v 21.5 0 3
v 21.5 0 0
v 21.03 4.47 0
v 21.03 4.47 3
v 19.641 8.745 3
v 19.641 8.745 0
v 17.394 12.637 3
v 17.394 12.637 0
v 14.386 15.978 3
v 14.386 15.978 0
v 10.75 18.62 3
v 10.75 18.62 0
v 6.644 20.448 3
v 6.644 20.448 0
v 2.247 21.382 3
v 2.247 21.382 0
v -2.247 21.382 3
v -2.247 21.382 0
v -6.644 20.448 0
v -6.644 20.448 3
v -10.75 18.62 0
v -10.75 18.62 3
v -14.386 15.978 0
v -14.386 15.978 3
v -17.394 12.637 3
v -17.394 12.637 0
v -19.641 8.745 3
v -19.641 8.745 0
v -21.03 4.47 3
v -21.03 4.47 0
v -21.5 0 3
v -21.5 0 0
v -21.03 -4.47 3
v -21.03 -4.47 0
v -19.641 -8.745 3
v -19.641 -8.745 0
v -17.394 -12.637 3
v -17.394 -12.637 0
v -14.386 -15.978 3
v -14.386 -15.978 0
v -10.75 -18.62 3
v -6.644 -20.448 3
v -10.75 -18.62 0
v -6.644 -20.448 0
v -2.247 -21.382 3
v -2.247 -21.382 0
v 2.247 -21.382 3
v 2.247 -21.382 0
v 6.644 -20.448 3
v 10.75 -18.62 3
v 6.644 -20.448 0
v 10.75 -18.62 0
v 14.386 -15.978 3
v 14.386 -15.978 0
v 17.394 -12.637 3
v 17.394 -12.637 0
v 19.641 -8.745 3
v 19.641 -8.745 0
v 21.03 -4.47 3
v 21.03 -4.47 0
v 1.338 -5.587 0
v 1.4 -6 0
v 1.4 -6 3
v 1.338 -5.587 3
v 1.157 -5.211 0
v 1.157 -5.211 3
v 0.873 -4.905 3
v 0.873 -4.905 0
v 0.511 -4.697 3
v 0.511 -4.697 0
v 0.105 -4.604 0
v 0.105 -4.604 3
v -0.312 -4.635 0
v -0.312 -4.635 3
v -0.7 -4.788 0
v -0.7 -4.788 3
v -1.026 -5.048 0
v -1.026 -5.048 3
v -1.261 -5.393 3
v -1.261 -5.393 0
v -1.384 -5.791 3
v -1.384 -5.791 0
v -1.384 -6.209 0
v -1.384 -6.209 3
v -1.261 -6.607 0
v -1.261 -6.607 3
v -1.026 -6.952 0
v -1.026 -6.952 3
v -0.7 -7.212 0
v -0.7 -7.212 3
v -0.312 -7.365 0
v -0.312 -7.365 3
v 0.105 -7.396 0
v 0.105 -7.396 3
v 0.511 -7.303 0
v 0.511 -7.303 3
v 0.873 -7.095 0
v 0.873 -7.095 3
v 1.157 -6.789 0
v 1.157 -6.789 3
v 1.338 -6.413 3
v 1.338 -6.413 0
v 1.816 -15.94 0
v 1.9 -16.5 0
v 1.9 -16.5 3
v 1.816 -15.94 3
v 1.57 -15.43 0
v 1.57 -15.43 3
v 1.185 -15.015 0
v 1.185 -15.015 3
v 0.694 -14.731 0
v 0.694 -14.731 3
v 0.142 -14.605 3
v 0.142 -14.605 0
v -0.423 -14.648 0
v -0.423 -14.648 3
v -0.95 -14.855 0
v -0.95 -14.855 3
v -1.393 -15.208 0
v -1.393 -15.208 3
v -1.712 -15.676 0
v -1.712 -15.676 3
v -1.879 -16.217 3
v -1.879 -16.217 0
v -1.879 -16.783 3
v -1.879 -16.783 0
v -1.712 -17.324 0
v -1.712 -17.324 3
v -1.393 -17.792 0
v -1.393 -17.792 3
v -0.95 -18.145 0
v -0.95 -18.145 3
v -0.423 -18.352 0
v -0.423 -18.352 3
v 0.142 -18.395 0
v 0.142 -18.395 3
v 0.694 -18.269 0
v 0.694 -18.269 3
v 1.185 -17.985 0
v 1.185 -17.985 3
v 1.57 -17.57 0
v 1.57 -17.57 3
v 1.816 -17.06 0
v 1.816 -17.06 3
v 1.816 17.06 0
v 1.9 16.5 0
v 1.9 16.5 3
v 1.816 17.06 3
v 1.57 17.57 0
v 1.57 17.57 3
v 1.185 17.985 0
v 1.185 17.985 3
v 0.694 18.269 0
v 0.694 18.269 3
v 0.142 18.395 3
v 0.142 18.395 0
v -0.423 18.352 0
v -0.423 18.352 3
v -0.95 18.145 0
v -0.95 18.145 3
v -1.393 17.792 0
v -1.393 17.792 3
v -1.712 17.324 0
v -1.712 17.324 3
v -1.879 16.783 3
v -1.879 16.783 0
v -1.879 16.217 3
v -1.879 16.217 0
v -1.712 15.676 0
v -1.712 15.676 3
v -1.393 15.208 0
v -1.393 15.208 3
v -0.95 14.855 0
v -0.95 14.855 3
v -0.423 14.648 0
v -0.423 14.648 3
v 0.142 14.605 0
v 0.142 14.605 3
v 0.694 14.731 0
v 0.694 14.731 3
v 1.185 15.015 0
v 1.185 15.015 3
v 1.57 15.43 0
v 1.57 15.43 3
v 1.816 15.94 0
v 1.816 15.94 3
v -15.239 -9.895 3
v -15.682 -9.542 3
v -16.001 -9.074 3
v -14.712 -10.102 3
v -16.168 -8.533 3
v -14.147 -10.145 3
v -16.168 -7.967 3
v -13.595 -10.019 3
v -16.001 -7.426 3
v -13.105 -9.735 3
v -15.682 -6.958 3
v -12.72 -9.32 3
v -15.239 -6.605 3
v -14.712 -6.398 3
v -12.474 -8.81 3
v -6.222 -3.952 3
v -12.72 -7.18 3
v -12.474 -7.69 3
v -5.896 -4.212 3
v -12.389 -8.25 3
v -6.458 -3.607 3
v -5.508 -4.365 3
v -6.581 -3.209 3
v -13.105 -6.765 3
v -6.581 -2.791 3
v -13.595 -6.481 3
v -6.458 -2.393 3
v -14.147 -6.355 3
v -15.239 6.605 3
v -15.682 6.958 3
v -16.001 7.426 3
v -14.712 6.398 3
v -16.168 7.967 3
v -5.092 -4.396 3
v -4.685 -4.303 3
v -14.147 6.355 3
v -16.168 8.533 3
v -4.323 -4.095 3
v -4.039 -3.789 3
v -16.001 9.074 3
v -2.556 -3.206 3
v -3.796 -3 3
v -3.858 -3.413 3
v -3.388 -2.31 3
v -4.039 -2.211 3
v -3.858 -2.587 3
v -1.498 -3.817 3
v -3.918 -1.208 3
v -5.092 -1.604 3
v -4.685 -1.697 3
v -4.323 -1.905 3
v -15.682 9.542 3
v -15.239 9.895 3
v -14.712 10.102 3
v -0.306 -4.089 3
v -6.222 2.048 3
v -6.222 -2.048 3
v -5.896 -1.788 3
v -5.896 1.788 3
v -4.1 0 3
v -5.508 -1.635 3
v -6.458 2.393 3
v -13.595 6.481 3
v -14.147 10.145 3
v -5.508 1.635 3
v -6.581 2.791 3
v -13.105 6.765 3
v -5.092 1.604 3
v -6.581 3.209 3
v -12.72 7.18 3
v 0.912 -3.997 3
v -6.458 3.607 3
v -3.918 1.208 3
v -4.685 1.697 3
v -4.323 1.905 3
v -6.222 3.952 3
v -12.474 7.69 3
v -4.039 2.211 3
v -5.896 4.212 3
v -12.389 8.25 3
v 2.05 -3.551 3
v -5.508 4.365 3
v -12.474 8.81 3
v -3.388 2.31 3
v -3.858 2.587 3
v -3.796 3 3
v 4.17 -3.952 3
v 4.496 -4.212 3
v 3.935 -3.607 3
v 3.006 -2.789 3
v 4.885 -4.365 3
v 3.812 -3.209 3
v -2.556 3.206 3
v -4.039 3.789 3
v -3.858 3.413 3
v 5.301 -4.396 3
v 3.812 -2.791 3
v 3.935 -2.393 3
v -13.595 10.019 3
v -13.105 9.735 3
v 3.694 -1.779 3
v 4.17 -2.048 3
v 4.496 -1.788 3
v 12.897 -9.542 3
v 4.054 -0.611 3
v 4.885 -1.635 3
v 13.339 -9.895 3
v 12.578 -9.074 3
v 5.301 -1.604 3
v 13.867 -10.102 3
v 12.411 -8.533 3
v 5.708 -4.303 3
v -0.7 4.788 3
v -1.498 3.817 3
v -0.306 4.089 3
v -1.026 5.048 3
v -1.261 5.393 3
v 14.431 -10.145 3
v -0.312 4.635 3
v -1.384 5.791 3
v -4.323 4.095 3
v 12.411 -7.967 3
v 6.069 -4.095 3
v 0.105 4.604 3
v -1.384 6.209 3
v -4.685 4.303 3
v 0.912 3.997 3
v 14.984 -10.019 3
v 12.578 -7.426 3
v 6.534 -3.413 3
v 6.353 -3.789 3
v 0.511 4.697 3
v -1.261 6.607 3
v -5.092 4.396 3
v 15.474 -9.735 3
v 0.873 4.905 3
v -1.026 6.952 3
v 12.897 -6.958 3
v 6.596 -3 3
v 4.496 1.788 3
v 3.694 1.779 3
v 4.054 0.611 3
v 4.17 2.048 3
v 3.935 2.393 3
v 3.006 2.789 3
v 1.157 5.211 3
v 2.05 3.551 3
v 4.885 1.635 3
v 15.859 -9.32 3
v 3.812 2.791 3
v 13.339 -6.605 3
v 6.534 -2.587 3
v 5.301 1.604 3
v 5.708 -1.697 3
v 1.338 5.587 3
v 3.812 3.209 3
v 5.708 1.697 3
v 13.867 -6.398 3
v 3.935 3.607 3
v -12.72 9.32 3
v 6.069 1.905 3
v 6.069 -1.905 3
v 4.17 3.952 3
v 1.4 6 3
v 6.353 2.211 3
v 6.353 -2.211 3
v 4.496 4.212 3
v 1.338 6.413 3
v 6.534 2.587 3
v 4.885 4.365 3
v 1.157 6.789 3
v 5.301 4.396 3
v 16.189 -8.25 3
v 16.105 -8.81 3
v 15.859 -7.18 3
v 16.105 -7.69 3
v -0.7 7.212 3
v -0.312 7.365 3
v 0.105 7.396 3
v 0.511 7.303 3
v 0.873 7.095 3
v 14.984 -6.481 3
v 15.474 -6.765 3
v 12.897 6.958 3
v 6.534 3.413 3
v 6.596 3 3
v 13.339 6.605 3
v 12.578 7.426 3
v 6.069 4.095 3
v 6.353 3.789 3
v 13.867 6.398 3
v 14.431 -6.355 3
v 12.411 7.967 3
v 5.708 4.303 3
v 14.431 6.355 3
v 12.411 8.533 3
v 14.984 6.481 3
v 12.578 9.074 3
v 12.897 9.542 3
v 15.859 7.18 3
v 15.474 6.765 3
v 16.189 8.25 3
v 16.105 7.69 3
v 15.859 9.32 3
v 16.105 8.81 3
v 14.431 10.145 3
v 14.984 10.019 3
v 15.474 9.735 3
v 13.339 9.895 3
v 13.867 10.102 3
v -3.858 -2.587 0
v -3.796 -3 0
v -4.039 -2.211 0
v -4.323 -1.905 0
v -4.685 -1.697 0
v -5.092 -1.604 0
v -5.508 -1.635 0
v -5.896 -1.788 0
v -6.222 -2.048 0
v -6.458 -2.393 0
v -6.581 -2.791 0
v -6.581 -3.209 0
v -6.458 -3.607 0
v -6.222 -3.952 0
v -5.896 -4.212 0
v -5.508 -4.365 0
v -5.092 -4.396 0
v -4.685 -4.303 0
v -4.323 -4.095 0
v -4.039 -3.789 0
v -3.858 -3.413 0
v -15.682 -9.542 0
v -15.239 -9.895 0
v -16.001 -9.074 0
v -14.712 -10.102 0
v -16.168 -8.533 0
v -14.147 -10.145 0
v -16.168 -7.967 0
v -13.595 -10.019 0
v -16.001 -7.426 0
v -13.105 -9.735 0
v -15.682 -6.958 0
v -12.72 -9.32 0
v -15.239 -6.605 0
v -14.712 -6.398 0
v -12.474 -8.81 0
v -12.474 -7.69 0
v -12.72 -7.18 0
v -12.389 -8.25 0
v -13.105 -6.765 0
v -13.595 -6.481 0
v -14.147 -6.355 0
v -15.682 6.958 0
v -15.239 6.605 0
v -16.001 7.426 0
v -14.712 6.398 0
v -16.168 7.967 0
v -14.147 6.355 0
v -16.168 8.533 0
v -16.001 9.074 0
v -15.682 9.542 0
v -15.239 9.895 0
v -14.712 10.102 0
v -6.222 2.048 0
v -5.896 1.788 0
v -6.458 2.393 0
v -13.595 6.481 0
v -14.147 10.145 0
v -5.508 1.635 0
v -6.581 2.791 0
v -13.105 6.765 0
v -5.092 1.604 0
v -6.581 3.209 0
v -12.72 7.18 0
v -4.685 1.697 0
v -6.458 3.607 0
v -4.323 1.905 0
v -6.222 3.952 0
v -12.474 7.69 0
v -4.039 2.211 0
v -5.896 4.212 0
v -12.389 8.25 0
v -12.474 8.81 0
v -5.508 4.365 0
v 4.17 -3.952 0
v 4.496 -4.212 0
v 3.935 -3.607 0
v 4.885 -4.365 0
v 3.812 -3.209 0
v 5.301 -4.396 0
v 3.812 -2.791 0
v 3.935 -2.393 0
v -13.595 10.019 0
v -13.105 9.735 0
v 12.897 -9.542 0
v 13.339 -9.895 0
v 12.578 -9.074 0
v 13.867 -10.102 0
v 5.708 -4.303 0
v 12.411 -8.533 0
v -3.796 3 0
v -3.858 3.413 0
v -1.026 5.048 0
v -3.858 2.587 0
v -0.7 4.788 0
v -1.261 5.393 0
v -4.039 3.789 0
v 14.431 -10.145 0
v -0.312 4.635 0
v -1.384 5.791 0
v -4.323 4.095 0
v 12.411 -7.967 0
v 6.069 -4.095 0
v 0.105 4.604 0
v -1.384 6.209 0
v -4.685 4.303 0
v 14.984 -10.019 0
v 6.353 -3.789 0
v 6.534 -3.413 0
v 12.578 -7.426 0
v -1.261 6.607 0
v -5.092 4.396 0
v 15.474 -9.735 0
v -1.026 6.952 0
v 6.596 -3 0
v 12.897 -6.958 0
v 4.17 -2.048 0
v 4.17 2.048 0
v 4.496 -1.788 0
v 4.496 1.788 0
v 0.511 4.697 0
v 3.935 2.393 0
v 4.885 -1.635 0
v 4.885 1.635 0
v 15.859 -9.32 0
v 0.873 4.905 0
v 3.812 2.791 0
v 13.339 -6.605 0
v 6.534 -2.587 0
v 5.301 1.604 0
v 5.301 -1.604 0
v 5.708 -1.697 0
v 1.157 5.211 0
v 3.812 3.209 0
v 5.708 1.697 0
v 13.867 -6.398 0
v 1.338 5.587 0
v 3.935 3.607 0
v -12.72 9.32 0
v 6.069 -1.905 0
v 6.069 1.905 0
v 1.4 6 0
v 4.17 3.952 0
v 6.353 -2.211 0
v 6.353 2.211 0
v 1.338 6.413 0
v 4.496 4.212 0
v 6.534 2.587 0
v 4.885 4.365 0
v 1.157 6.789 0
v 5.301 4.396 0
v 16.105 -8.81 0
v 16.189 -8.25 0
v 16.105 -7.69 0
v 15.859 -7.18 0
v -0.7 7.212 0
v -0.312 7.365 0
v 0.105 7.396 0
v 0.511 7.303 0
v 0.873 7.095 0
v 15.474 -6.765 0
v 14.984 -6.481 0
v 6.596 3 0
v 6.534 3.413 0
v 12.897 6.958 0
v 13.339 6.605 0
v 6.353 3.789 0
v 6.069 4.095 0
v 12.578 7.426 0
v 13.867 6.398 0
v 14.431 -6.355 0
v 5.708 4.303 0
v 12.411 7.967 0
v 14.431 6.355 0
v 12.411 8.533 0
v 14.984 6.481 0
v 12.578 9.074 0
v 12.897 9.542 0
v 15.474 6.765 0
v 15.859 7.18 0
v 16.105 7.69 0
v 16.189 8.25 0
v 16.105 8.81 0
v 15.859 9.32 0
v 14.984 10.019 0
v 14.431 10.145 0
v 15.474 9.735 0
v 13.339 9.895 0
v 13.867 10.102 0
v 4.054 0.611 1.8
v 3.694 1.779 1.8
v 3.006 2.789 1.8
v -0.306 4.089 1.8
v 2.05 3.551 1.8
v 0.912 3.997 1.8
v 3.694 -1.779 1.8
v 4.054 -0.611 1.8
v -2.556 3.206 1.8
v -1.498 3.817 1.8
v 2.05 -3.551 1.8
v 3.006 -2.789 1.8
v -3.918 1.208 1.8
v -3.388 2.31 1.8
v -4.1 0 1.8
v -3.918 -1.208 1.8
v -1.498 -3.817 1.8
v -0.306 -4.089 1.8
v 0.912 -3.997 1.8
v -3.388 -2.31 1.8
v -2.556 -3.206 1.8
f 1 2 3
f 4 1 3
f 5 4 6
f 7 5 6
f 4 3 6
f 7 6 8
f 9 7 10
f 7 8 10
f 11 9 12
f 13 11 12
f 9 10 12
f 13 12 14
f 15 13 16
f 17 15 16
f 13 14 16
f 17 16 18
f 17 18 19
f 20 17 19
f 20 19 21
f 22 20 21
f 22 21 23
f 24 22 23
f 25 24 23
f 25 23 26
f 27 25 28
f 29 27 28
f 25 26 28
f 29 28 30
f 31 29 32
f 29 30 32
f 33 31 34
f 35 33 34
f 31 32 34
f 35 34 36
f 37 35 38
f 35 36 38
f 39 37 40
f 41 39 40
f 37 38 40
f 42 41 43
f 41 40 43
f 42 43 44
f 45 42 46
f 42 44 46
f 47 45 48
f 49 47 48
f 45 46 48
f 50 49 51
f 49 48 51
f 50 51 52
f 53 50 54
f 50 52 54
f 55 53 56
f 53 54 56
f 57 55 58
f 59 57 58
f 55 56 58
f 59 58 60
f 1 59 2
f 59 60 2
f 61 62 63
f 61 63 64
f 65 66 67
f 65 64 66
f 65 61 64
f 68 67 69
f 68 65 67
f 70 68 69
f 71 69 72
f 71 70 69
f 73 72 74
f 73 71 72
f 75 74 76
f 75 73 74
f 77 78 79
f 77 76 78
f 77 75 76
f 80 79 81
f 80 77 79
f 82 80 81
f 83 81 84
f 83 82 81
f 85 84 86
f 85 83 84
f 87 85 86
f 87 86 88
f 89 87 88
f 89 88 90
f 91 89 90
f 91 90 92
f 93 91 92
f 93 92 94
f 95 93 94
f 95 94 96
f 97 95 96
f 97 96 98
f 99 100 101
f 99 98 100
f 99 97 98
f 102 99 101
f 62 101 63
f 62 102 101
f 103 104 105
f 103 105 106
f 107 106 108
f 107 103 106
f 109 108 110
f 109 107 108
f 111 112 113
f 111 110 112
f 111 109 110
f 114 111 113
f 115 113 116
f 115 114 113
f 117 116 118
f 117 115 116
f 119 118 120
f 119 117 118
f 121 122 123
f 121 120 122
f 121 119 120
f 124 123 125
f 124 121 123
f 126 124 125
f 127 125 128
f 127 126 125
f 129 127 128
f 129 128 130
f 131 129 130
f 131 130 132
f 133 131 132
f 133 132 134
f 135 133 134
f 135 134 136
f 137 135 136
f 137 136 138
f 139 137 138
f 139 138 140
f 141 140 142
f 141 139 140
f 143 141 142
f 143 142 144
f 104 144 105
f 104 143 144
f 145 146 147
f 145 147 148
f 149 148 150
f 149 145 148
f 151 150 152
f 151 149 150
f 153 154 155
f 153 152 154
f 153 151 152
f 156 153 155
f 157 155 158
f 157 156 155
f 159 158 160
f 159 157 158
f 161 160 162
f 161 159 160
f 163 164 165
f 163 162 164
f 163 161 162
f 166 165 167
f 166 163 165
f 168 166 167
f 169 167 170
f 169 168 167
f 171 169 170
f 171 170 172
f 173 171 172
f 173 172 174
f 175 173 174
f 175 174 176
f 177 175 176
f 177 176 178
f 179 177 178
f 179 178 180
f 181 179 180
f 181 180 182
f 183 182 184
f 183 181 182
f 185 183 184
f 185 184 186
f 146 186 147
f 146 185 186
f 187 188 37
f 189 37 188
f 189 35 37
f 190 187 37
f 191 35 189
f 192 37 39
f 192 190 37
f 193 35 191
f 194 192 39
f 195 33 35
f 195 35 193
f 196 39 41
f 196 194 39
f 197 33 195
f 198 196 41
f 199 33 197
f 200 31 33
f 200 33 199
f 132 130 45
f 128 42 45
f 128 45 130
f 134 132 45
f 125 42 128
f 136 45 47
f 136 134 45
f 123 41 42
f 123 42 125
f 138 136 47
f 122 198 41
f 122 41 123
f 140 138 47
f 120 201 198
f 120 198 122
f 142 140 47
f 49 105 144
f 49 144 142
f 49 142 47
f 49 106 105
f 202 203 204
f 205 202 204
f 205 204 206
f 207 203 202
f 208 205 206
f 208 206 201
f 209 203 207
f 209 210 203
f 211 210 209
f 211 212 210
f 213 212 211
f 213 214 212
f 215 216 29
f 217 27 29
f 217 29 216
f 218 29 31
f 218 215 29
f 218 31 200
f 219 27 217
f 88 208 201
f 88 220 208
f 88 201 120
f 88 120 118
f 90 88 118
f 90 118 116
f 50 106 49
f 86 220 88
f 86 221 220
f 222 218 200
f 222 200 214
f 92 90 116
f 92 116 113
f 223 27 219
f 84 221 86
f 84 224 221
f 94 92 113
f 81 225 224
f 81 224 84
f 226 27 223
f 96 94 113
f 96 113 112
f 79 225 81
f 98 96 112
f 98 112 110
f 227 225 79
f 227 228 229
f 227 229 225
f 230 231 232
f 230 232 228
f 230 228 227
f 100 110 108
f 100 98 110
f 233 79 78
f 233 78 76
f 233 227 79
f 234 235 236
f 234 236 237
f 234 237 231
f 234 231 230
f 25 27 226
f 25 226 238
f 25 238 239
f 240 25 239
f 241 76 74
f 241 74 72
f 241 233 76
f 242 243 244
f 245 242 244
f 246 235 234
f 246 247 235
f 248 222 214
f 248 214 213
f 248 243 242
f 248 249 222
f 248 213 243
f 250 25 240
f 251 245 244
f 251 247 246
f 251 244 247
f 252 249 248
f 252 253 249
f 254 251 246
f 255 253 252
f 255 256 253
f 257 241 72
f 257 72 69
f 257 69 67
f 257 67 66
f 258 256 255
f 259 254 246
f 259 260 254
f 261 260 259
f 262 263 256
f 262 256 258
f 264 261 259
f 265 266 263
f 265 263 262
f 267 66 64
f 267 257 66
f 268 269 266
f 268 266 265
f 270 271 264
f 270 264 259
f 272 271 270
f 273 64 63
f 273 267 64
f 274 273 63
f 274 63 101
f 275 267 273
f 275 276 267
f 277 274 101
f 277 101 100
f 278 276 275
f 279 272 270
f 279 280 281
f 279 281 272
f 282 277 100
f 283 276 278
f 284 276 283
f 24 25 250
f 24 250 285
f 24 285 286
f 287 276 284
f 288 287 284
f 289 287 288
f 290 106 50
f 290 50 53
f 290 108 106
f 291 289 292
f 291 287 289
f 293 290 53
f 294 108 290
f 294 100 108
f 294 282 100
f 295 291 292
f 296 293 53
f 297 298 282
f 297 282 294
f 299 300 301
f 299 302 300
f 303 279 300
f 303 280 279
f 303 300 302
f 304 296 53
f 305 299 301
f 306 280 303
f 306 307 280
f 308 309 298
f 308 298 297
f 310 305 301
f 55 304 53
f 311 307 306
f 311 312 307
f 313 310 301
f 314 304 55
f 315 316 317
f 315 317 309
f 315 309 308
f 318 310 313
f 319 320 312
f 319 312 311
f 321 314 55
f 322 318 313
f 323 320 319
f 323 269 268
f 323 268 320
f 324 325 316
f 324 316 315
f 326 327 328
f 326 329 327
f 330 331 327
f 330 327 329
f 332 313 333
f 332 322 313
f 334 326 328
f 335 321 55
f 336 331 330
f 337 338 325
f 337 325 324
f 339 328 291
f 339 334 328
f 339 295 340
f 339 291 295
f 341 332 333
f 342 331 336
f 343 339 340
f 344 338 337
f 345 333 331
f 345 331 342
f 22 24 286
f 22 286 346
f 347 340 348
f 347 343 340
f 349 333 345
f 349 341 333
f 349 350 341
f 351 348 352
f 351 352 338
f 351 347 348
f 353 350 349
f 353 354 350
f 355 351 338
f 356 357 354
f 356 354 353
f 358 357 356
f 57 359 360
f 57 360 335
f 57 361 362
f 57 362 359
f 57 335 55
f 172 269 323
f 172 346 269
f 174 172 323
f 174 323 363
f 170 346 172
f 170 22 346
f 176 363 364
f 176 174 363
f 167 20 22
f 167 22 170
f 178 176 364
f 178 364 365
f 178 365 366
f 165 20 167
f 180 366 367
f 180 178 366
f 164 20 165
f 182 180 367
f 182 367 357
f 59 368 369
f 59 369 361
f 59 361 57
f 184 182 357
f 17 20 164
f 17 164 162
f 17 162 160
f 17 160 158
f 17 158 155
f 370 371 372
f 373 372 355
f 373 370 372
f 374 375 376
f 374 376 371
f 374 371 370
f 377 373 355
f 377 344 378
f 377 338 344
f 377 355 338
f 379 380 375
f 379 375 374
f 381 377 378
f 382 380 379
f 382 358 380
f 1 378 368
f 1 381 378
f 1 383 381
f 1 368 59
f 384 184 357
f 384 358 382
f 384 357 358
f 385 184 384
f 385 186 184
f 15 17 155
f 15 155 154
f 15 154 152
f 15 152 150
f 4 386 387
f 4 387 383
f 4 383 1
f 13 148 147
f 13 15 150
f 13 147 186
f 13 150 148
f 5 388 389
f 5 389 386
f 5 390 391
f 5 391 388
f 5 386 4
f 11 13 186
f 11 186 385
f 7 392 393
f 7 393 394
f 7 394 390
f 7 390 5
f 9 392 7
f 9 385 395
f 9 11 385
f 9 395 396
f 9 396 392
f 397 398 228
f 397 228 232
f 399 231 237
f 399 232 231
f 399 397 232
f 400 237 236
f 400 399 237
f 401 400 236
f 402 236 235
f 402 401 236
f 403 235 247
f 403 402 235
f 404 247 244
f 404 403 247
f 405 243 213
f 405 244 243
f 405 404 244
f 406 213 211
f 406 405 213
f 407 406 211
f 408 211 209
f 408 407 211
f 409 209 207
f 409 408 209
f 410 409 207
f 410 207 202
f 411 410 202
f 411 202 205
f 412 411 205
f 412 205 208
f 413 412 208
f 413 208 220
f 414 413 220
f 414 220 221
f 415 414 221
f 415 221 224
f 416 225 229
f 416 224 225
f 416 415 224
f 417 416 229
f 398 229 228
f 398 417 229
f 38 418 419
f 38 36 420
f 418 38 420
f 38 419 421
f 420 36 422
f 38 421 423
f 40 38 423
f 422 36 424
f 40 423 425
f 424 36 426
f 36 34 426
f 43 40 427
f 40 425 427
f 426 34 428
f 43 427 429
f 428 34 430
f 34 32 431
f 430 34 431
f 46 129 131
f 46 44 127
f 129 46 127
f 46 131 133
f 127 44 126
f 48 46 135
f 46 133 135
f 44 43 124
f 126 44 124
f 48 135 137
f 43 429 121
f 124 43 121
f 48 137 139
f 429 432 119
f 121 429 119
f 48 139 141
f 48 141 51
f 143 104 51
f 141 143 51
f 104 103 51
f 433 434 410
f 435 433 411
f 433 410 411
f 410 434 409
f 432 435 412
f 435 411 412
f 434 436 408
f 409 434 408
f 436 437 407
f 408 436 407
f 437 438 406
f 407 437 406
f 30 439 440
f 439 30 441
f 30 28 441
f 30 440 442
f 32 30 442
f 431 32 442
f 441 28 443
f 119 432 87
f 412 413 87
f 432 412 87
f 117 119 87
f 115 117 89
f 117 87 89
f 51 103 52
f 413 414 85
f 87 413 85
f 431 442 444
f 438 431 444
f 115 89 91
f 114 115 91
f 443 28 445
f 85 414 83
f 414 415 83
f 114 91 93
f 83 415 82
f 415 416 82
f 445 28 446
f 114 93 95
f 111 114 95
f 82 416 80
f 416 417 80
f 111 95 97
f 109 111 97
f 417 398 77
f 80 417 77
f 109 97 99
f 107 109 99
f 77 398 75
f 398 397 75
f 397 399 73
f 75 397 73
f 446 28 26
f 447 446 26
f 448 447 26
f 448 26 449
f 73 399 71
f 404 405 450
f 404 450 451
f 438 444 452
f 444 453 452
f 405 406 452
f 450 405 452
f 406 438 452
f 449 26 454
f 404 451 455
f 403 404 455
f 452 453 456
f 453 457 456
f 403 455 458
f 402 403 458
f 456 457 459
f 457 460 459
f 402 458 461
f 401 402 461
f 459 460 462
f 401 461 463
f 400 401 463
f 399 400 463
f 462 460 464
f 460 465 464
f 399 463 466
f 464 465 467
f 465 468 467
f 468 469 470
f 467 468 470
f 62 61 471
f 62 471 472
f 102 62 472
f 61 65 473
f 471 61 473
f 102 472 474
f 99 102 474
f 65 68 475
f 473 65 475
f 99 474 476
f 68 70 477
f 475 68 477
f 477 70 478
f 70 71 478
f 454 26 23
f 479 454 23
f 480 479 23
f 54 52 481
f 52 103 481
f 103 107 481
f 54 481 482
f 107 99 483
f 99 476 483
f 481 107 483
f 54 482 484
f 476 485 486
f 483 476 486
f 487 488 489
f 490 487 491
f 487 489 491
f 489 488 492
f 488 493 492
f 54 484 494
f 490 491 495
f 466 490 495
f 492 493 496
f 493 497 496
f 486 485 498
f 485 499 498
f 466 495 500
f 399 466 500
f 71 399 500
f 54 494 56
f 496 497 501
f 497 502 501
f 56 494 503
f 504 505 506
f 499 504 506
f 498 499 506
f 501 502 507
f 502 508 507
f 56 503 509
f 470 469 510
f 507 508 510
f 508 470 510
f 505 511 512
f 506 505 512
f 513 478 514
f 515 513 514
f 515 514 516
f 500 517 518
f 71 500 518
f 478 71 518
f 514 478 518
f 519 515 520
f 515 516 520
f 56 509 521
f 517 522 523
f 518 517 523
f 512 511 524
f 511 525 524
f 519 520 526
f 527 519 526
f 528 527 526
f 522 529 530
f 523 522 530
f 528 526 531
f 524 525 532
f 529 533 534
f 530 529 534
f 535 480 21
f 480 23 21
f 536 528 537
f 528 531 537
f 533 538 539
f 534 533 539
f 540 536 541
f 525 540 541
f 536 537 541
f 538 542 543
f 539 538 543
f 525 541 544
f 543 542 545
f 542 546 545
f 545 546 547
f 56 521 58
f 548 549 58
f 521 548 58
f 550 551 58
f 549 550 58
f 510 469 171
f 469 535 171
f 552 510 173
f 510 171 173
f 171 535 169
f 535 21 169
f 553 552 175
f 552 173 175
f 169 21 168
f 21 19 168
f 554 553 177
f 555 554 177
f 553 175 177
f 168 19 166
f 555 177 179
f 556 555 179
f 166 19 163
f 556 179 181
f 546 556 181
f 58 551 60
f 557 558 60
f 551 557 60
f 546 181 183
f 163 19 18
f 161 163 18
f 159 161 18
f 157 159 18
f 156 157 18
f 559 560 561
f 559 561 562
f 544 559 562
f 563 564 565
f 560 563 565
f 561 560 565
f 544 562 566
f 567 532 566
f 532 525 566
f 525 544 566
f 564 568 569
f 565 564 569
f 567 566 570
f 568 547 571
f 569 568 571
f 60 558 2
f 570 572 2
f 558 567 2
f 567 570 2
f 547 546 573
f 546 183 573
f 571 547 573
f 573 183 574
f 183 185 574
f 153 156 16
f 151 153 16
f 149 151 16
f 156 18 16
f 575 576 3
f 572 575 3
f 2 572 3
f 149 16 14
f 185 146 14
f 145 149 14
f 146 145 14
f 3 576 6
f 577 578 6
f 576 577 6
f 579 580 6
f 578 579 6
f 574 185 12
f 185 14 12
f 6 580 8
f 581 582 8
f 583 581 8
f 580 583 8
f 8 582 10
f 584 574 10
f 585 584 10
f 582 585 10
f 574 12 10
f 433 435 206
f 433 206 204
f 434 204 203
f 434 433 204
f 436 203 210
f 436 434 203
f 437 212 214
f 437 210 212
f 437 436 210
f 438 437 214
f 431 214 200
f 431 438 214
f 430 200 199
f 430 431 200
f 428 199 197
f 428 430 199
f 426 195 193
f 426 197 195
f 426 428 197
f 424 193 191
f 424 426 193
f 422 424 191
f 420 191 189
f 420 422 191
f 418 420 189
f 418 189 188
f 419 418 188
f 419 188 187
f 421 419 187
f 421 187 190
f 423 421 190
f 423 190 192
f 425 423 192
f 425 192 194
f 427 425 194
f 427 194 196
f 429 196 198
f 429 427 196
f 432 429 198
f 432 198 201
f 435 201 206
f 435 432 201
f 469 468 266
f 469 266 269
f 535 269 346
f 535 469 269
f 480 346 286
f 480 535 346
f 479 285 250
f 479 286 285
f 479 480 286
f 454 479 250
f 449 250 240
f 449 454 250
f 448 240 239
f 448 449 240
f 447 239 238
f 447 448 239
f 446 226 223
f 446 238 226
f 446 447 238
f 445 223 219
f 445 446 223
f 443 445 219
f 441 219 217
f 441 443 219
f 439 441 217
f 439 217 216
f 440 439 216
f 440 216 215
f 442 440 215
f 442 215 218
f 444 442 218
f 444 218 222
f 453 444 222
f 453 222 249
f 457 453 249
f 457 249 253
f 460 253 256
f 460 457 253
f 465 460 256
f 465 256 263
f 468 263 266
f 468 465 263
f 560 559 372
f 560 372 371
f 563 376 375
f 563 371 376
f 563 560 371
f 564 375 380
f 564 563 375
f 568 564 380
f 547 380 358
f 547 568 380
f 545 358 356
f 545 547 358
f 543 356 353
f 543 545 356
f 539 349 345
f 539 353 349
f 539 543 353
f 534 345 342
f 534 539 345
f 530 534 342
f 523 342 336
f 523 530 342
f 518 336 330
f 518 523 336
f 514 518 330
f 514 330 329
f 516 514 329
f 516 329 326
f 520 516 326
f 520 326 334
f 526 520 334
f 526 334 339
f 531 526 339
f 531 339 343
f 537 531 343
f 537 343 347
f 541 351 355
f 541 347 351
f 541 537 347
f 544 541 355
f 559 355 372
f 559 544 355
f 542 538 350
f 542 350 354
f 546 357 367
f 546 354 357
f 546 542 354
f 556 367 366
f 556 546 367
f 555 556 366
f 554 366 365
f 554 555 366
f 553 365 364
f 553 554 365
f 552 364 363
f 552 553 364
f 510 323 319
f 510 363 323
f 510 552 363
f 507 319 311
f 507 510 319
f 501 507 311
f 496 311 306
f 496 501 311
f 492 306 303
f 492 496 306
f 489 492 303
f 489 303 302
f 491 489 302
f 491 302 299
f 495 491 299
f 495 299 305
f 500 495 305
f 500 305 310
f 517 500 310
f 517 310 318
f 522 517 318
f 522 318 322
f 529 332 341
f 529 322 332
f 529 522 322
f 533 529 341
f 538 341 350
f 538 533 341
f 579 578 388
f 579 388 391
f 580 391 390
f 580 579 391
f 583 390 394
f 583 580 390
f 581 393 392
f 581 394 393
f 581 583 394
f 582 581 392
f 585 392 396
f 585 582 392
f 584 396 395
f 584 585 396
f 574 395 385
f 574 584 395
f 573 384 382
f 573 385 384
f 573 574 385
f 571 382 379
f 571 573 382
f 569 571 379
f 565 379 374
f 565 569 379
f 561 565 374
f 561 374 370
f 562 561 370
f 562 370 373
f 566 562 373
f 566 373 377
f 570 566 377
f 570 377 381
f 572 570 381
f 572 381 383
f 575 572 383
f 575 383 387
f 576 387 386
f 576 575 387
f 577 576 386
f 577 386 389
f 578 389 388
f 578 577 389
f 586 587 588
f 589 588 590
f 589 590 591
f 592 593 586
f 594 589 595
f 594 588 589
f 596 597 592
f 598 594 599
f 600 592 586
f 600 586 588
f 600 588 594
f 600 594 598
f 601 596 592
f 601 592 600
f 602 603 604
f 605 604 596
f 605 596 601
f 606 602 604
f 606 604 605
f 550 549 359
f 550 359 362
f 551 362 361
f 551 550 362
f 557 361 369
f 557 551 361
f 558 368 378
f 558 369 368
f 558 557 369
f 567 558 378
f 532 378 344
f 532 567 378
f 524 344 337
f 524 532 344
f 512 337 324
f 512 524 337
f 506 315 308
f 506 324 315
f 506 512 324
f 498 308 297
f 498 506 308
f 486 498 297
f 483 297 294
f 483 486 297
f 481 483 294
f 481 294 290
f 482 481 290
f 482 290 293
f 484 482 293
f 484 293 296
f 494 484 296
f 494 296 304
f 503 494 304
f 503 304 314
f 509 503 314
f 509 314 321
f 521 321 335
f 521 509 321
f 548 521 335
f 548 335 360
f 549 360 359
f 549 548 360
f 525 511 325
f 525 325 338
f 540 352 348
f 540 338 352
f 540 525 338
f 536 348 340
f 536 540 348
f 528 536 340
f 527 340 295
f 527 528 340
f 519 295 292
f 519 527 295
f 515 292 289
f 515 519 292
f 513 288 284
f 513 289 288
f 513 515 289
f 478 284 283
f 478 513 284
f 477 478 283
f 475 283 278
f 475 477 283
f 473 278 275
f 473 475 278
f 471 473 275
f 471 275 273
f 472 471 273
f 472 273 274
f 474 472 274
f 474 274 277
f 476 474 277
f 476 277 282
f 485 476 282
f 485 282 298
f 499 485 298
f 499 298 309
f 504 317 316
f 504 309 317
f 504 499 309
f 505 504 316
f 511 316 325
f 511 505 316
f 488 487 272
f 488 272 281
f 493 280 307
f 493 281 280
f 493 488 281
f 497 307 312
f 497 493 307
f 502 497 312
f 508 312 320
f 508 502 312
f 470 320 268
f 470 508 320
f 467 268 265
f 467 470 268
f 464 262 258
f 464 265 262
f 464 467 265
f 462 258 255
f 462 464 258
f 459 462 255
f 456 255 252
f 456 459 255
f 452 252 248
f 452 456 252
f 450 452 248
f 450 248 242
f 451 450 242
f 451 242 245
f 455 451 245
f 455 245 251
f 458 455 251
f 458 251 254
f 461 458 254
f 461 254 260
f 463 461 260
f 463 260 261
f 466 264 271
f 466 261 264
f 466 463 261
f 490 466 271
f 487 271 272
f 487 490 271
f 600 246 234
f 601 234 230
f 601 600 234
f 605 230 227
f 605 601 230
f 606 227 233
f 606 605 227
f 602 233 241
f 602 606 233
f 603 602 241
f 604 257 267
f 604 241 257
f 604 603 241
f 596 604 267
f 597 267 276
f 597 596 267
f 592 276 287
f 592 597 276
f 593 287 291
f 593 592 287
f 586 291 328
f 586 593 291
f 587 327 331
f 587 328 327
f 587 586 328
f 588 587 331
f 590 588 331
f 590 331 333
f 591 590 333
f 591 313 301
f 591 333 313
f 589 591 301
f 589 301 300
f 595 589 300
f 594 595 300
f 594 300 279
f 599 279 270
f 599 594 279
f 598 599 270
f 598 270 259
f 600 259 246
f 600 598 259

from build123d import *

# Parameters (mm, degrees)
SKETCH_1_R               = 21.5
EXTRUDE_1_DEPTH          = 3
CUT_EXTRUDE_1_DEPTH      = 31.553232235
CUT_EXTRUDE_1_DEPTH_BACK = 31.553232235
SKETCH_2_R               = 1.4
CUT_EXTRUDE_2_DEPTH      = 31.553232235
CUT_EXTRUDE_2_DEPTH_BACK = 31.553232235
SKETCH_3_R               = 1.9
CUT_EXTRUDE_3_DEPTH      = 31.553232235
CUT_EXTRUDE_3_DEPTH_BACK = 1.2
SKETCH_4_R               = 4.1


with BuildPart() as part:
    # ｽｹｯﾁ1 → ﾎﾞｽ - 押し出し1 (new body)
    with BuildSketch(Plane.XY):
        Circle(SKETCH_1_R)
    extrude(amount=EXTRUDE_1_DEPTH)

    # ｽｹｯﾁ2 → ｶｯﾄ - 押し出し1 (cut, two sides: drawn at the far end of the back side and taken through both)
    with BuildSketch(Plane.XY.offset(-CUT_EXTRUDE_1_DEPTH_BACK)):
        with Locations((0, 6)):
            Circle(SKETCH_2_R)
        with Locations((5.196152423, 3)):
            Circle(SKETCH_2_R)
        with Locations((5.196152423, -3)):
            Circle(SKETCH_2_R)
        with Locations((0, -6)):
            Circle(SKETCH_2_R)
        with Locations((-5.196152423, -3)):
            Circle(SKETCH_2_R)
        with Locations((-5.196152423, 3)):
            Circle(SKETCH_2_R)
    extrude(amount=CUT_EXTRUDE_1_DEPTH + CUT_EXTRUDE_1_DEPTH_BACK, mode=Mode.SUBTRACT)

    # ｽｹｯﾁ3 → ｶｯﾄ - 押し出し2 (cut, two sides: drawn at the far end of the back side and taken through both)
    with BuildSketch(Plane.XY.offset(3).offset(-CUT_EXTRUDE_2_DEPTH_BACK)):
        with Locations((0, 16.5)):
            Circle(SKETCH_3_R)
        with Locations((14.289419162, 8.25)):
            Circle(SKETCH_3_R)
        with Locations((14.289419162, -8.25)):
            Circle(SKETCH_3_R)
        with Locations((0, -16.5)):
            Circle(SKETCH_3_R)
        with Locations((-14.289419162, -8.25)):
            Circle(SKETCH_3_R)
        with Locations((-14.289419162, 8.25)):
            Circle(SKETCH_3_R)
    extrude(amount=CUT_EXTRUDE_2_DEPTH + CUT_EXTRUDE_2_DEPTH_BACK, mode=Mode.SUBTRACT)

    # ｽｹｯﾁ4 → ｶｯﾄ - 押し出し3 (cut, two sides: drawn at the far end of the back side and taken through both)
    with BuildSketch(Plane.XY.offset(3).offset(-CUT_EXTRUDE_3_DEPTH_BACK)):
        with Locations(Location((0, 0, 0), (0, 0, 180))):
            Circle(SKETCH_4_R)
    extrude(amount=CUT_EXTRUDE_3_DEPTH + CUT_EXTRUDE_3_DEPTH_BACK, mode=Mode.SUBTRACT)


solid = part.part
